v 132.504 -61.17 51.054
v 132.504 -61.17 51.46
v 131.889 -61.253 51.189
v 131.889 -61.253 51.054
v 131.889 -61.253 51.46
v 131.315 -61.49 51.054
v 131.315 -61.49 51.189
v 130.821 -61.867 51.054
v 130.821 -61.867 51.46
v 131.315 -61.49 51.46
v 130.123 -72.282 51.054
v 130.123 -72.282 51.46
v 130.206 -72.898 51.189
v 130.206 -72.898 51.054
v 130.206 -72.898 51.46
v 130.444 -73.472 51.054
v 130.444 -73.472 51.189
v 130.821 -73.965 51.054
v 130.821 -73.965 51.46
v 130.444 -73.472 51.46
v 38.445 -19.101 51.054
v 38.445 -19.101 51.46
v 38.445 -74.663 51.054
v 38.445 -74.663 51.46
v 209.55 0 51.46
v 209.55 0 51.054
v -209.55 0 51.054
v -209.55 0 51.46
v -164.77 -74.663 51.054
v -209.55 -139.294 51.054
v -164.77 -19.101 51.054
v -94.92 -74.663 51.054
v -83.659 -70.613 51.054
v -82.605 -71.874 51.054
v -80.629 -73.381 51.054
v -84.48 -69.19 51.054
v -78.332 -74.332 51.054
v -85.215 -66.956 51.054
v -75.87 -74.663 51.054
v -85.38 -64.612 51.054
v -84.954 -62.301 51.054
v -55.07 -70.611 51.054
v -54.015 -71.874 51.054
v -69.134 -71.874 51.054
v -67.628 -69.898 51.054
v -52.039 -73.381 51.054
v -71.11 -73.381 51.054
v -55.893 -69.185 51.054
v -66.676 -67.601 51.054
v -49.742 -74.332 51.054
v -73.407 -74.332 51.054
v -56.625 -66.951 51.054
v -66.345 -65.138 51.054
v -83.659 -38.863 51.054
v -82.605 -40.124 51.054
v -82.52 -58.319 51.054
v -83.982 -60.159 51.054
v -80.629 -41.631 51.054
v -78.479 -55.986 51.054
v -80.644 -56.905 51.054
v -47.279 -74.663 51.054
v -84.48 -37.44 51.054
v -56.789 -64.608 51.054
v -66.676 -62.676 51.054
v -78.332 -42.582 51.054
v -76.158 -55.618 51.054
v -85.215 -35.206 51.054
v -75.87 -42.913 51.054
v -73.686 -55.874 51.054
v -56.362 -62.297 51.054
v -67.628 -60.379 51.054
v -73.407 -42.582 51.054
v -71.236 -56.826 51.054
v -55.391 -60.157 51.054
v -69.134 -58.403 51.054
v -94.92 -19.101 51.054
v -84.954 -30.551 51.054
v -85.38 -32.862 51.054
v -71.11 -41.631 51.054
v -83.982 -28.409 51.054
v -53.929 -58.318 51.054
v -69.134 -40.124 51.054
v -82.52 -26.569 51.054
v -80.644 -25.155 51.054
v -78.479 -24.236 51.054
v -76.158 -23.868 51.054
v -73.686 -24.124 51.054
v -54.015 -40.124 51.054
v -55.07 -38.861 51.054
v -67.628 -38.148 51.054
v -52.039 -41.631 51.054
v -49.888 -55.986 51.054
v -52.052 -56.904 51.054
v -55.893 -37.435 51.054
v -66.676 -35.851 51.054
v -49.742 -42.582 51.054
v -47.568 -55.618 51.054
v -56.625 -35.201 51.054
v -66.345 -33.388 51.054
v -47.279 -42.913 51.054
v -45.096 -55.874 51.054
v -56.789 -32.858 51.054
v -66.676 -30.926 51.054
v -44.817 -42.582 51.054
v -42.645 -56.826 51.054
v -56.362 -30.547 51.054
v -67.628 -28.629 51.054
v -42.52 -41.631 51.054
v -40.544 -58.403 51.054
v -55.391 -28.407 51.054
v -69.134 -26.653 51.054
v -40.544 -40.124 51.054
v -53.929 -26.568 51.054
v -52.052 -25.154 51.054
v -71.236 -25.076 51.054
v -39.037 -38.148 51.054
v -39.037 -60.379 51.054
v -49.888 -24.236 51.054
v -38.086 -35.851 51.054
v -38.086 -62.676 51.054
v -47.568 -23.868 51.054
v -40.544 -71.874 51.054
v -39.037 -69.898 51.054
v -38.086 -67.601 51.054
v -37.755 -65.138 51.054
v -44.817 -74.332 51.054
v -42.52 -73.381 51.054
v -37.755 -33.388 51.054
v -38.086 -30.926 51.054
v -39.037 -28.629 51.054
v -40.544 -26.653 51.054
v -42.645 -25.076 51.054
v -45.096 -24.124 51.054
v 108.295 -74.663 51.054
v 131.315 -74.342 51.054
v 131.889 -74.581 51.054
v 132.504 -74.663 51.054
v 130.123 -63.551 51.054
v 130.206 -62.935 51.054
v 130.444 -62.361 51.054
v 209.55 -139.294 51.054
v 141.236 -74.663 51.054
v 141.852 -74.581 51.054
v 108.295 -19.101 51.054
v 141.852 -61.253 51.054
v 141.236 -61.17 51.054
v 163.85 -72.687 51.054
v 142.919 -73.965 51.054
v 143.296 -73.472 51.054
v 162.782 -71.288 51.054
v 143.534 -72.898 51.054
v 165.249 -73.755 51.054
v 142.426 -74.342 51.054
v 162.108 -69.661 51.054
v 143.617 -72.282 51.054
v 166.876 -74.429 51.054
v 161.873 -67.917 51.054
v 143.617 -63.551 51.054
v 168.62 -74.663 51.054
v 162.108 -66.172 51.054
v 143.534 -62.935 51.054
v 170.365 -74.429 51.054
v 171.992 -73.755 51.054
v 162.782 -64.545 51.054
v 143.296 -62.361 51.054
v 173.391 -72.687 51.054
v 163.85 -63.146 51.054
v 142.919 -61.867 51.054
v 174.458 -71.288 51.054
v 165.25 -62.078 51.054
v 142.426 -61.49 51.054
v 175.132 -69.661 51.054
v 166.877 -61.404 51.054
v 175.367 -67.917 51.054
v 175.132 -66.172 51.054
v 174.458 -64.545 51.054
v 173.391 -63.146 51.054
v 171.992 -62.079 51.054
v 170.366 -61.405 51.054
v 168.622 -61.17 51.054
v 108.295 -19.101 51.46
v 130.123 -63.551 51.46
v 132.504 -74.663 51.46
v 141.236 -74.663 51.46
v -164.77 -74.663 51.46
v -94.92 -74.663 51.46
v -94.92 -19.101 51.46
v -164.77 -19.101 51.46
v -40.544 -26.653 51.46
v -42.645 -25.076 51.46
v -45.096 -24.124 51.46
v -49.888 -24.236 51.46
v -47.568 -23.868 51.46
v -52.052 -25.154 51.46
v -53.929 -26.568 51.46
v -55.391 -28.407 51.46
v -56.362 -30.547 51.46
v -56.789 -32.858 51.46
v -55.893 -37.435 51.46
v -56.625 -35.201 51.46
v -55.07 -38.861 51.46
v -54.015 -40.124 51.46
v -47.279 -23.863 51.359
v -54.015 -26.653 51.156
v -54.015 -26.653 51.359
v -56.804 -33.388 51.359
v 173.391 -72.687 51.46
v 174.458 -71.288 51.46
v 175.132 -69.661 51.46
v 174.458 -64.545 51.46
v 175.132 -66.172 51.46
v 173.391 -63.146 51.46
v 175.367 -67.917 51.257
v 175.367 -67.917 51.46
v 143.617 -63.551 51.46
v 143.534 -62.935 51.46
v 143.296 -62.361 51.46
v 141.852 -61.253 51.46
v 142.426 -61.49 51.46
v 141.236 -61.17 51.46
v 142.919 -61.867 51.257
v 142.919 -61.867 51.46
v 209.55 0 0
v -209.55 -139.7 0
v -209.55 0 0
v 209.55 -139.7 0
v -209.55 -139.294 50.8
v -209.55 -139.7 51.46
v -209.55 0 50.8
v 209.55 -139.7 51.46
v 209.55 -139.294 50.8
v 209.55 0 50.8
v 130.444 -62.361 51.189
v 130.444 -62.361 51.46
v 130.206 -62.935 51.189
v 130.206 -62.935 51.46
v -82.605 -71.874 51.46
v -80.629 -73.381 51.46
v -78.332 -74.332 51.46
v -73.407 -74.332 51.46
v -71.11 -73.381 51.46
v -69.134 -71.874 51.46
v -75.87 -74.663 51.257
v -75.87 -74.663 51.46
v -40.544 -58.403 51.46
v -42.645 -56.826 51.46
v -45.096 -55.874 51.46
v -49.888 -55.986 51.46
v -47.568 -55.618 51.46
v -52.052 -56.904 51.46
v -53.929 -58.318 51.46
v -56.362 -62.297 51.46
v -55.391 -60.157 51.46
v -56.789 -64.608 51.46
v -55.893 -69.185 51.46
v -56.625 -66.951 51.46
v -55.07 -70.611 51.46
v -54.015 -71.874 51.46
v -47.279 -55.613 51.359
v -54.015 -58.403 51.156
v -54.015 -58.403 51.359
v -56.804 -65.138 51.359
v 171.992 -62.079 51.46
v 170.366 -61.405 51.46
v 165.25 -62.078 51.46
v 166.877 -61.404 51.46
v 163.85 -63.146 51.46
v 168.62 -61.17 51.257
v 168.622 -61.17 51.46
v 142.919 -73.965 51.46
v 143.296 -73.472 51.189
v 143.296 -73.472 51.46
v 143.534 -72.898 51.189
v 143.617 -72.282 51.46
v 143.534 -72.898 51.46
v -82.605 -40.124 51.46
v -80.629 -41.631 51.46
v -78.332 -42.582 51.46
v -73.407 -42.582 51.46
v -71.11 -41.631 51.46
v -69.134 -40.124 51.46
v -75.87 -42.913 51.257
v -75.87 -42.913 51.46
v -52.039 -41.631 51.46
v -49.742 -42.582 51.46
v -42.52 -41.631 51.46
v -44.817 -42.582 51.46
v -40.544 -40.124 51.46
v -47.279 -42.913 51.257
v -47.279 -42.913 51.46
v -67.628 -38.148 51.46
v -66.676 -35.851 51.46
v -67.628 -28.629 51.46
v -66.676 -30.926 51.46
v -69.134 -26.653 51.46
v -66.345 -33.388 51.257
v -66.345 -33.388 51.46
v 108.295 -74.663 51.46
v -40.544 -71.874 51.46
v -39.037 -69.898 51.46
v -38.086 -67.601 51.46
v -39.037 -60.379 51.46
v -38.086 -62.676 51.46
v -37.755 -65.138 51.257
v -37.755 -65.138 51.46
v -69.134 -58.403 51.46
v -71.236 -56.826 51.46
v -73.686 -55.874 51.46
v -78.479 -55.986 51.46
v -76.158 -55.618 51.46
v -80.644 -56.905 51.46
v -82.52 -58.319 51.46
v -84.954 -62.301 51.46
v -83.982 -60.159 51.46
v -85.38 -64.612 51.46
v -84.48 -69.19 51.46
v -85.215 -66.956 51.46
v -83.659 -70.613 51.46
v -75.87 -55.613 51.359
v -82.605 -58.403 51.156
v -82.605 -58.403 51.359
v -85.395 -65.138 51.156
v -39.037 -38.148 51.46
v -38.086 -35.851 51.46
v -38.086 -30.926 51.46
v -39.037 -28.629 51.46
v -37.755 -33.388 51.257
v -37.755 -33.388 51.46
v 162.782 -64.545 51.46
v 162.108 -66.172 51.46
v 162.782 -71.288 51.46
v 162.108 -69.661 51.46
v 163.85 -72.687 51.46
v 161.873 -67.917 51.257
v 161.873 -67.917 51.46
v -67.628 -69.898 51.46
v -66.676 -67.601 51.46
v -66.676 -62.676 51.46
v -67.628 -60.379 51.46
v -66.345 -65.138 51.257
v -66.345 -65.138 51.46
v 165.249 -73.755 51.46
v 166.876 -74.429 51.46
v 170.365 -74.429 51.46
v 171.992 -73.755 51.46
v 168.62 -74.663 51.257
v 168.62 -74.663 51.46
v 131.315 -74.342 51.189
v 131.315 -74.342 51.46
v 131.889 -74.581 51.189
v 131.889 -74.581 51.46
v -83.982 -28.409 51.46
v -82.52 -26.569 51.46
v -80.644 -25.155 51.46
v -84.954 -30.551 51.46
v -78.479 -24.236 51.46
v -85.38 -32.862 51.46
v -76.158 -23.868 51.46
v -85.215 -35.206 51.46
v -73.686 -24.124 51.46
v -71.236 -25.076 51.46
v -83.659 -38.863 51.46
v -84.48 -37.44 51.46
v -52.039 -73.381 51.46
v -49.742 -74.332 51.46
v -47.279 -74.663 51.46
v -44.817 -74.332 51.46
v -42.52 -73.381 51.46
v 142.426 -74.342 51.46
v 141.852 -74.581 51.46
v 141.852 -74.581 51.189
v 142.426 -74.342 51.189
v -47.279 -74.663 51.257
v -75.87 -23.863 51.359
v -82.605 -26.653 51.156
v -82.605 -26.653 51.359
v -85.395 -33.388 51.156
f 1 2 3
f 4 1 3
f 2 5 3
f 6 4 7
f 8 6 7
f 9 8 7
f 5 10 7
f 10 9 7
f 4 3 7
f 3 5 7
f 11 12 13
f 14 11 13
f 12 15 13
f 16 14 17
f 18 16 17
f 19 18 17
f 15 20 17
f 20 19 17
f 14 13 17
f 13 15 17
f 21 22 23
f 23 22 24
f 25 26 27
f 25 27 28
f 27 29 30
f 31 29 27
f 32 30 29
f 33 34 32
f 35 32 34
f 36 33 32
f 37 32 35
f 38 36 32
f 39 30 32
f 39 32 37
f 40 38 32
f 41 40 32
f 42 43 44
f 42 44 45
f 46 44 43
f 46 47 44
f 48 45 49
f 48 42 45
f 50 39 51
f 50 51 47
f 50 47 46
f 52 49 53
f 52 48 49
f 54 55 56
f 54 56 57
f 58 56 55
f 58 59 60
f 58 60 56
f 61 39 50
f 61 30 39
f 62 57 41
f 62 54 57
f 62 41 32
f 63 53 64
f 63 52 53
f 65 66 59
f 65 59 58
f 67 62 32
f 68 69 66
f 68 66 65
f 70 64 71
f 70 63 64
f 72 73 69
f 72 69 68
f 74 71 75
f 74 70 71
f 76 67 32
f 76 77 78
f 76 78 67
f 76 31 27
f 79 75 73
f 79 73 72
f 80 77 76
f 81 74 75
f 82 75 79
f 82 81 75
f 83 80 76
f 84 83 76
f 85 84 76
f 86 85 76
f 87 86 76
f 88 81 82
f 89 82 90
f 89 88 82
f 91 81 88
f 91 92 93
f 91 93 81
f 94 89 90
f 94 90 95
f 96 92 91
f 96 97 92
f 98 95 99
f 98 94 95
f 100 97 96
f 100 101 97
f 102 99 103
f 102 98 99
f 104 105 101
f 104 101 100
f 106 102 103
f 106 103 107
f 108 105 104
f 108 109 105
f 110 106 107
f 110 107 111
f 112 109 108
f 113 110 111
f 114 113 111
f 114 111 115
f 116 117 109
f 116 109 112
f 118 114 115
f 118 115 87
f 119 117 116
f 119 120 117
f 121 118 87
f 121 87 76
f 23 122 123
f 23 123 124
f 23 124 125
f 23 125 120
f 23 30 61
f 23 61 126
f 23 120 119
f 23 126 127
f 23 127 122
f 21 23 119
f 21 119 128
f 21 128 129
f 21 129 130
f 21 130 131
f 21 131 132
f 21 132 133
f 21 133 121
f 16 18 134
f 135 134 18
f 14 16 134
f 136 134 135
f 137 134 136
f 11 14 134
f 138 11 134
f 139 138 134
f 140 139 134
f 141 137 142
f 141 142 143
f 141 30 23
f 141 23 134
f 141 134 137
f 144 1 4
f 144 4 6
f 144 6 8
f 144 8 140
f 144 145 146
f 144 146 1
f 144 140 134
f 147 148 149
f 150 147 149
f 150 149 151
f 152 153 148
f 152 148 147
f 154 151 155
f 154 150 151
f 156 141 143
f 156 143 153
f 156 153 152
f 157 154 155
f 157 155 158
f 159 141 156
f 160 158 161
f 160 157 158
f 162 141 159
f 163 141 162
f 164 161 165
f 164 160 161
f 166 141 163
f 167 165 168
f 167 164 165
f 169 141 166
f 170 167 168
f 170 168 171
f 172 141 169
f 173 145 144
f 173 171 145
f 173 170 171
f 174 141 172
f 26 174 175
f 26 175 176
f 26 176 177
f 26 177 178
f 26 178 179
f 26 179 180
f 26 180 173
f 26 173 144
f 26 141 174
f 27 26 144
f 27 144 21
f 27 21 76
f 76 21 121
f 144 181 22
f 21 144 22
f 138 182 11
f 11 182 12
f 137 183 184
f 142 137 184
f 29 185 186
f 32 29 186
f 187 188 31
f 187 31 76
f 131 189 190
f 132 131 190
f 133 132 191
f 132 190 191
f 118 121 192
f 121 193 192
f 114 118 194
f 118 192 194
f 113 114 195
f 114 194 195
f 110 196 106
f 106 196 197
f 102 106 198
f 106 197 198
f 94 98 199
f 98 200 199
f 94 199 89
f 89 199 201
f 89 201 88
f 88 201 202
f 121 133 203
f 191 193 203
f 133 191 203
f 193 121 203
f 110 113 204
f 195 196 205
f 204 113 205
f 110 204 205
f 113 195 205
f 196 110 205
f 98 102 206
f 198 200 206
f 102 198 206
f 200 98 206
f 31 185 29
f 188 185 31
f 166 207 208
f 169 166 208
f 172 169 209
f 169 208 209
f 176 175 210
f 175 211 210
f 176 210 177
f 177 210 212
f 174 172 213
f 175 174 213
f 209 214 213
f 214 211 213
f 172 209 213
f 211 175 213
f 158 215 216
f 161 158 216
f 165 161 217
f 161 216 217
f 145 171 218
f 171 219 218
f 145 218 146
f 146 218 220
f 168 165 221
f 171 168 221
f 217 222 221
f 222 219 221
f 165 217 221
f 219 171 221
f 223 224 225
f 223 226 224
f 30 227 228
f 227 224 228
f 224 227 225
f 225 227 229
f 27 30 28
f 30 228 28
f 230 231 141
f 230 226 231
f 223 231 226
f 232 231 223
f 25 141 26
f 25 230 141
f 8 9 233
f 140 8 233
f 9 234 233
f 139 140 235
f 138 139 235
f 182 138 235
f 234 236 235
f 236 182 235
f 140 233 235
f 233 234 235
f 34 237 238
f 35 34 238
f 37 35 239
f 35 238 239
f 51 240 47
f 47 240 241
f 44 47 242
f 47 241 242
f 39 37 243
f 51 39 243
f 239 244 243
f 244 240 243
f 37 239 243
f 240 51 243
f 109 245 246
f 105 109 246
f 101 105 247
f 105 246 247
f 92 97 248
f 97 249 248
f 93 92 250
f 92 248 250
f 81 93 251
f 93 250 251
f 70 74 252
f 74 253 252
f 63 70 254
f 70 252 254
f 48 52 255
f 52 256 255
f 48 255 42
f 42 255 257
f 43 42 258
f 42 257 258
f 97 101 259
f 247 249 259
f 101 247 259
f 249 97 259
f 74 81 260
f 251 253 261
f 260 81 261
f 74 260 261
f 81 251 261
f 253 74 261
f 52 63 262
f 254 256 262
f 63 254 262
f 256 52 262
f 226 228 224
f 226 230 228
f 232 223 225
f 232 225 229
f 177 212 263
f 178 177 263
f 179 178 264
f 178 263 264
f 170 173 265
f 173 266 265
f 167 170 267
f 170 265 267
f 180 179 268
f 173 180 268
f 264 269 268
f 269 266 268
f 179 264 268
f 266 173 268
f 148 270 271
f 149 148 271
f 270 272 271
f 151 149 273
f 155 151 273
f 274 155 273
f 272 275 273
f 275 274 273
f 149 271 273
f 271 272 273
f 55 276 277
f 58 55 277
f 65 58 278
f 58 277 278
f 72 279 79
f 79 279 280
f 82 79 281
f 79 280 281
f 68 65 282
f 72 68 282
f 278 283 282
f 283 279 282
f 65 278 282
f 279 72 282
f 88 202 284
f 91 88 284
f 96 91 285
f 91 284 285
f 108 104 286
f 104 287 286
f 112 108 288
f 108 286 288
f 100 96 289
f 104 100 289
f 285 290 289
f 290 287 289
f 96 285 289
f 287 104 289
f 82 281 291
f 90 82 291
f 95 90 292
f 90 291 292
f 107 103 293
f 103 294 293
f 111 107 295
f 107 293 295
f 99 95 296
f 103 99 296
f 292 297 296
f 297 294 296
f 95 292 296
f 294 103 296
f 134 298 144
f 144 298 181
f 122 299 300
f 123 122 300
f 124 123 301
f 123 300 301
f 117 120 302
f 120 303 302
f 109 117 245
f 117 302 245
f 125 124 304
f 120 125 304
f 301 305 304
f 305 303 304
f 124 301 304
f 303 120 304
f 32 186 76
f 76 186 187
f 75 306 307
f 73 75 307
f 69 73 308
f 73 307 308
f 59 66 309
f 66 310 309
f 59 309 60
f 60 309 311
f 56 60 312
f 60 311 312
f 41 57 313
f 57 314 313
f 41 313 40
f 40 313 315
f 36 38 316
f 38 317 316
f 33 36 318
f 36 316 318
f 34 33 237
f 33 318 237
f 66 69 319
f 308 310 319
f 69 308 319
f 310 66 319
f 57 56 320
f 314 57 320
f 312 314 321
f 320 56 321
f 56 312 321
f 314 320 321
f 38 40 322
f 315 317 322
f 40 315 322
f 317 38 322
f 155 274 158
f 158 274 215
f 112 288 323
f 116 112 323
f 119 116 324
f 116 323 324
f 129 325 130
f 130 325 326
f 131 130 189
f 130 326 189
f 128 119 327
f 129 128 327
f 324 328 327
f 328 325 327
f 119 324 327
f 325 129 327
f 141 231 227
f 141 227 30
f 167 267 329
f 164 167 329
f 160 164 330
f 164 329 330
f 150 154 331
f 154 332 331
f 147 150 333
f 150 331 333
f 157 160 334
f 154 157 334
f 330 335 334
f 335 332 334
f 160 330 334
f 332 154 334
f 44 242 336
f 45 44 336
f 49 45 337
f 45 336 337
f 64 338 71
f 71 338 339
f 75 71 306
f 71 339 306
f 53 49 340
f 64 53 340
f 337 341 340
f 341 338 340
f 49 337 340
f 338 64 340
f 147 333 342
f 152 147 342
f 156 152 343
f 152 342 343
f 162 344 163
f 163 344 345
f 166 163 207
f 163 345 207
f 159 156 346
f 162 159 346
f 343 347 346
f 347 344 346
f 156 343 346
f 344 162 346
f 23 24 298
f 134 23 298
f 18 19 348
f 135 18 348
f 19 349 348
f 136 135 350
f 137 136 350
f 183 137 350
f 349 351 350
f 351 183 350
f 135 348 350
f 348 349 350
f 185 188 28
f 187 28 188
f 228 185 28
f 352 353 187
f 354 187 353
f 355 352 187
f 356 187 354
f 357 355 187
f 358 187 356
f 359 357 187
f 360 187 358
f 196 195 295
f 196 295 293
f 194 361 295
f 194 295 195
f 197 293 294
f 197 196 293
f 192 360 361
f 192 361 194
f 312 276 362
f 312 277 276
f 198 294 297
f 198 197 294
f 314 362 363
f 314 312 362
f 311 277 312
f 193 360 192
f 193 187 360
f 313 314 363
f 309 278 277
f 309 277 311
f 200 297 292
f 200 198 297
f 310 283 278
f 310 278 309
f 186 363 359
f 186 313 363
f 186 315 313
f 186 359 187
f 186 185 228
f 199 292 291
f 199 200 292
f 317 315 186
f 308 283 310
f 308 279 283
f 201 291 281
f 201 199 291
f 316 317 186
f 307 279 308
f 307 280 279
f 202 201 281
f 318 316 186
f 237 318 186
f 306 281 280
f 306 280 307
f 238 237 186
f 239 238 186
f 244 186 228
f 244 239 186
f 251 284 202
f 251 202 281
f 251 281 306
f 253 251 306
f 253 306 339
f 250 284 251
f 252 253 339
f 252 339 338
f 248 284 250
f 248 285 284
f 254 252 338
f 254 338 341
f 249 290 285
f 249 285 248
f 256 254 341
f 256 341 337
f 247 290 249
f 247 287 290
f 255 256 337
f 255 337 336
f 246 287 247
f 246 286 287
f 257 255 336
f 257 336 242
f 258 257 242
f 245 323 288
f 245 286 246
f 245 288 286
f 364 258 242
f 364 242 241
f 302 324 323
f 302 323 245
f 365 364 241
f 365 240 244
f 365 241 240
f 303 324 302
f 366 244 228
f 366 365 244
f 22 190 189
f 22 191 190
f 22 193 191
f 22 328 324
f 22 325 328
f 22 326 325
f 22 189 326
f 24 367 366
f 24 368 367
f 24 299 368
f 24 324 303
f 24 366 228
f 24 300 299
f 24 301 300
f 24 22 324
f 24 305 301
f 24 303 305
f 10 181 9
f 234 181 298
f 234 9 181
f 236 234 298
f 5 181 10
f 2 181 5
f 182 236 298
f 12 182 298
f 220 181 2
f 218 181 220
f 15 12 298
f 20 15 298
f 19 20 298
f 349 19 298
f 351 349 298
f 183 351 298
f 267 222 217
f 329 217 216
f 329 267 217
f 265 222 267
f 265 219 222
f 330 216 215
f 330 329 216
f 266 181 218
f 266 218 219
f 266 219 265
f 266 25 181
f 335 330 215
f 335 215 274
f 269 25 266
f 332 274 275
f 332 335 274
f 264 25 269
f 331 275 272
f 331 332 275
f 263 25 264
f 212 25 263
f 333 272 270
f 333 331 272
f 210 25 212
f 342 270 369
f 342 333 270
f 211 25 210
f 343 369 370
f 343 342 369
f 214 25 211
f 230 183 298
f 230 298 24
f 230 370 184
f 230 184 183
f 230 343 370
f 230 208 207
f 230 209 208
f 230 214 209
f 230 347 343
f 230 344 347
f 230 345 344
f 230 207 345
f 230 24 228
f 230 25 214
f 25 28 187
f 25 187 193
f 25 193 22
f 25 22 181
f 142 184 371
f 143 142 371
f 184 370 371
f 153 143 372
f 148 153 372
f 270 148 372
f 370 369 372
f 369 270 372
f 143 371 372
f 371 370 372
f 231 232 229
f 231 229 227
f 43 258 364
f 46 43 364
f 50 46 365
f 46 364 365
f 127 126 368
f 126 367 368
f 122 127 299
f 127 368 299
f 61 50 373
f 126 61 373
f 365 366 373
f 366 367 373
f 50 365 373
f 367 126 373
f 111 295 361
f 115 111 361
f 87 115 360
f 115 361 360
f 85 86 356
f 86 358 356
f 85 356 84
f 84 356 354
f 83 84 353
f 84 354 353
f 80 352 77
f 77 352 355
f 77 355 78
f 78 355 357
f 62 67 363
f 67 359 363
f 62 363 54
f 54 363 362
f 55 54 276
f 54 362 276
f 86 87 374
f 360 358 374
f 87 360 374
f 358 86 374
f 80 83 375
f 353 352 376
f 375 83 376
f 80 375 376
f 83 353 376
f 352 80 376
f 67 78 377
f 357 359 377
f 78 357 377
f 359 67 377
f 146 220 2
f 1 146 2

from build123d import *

# Parameters (mm, degrees)
F1_DEPTH = 209.55
F2_W     = 69.85
F2_H     = 55.5625
F3_DEPTH = 0.4064


# Not quite as in the source:
# - the dataset's text gives a spline's control points without its knots; the knots are read off the source's solid


with BuildPart() as f1:
    # F0 (on Right) → F1 (new body, symmetric)
    with BuildSketch(Plane.YZ):
        Polygon((-139.7, 0), (0, 0), (0, 50.8), (-139.2936, 50.8), (-139.2936, 51.054), (0, 51.054), (0, 51.4604), (-139.7, 51.4604), align=None)
    extrude(amount=F1_DEPTH, both=True)

    # F2 (on face) → F3 (cut, through all)
    with BuildSketch(Plane.XY.offset(51.4604)):
        with Locations((-129.8449253923, -46.8822261976)):
            Rectangle(F2_W, F2_H)
        Polygon((108.2948828077, -19.1009761976), (38.4448828077, -19.1009761976), (38.4448828077, -74.6634761976), (108.2948828077, -74.6634761976), (108.2948828077, -68.4133743976), (108.2948828077, -42.0156877976), align=None)
        with BuildLine():
            add(Edge.make_bspline(
                [(130.8209744077, -61.8670069976), (130.3807162077, -62.3079763976), (130.1230078077, -62.9274315976), (130.1230078077, -63.5509761976)],
                knots=[1, 1, 1, 1, 2, 2, 2, 2], degree=3))
            Line((130.1230078077, -63.5509761976), (130.1230078077, -72.2822261976))
            add(Edge.make_bspline(
                [(130.1230078077, -72.2822261976), (130.1230078077, -72.9057961976), (130.3807162077, -73.5252259976), (130.8209744077, -73.9654841976)],
                knots=[0, 0, 0, 0, 1, 1, 1, 1], degree=3))
            add(Edge.make_bspline(
                [(130.8209744077, -73.9654841976), (131.2619438077, -74.4064789976), (131.8813990077, -74.6634761976), (132.5042578077, -74.6634761976)],
                knots=[1, 1, 1, 1, 2, 2, 2, 2], degree=3))
            Line((132.5042578077, -74.6634761976), (141.2355078077, -74.6634761976))
            add(Edge.make_bspline(
                [(141.2355078077, -74.6634761976), (141.8597382077, -74.6634761976), (142.4784822077, -74.4064789976), (142.9194516077, -73.9654841976)],
                knots=[0, 0, 0, 0, 1, 1, 1, 1], degree=3))
            add(Edge.make_bspline(
                [(142.9194516077, -73.9654841976), (143.3604210077, -73.5252259976), (143.6167578077, -72.9057961976), (143.6167578077, -72.2822261976)],
                knots=[1, 1, 1, 1, 2, 2, 2, 2], degree=3))
            Line((143.6167578077, -72.2822261976), (143.6167578077, -63.5509761976))
            add(Edge.make_bspline(
                [(143.6167578077, -63.5509761976), (143.6167578077, -62.9274315976), (143.3604210077, -62.3079763976), (142.9194516077, -61.8670069976), (142.4784822077, -61.4260375976), (141.8597382077, -61.1697261976), (141.2355078077, -61.1697261976)],
                knots=[0, 0, 0, 0, 1, 1, 1, 2, 2, 2, 2], degree=3))
            Line((141.2355078077, -61.1697261976), (132.5042578077, -61.1697261976))
            add(Edge.make_bspline(
                [(132.5042578077, -61.1697261976), (131.8813990077, -61.1697261976), (131.2619438077, -61.4260375976), (130.8209744077, -61.8670069976)],
                knots=[0, 0, 0, 0, 1, 1, 1, 1], degree=3))
        make_face()
        with BuildLine():
            add(Edge.make_bspline(
                [(-69.1344295923, -26.6533105976), (-70.8976467923, -24.8901187976), (-73.3763565923, -23.8634761976), (-75.8699253923, -23.8634761976)],
                knots=[7, 7, 7, 7, 8, 8, 8, 8], degree=3))
            add(Edge.make_bspline(
                [(-75.8699253923, -23.8634761976), (-78.3631639923, -23.8634761976), (-80.8419245923, -24.8901187976), (-82.6050909923, -26.6533105976), (-84.3682827923, -28.4165277976), (-85.3949253923, -30.8949327976), (-85.3949253923, -33.3884761976), (-85.3949253923, -35.8820449976), (-84.3682827923, -38.3604499976), (-82.6050909923, -40.1236163976)],
                knots=[0, 0, 0, 0, 1, 1, 1, 2, 2, 2, 3, 3, 3, 3], degree=3))
            add(Edge.make_bspline(
                [(-82.6050909923, -40.1236163976), (-80.8419245923, -41.8868589976), (-78.3631639923, -42.9134761976), (-75.8699253923, -42.9134761976), (-73.3763565923, -42.9134761976), (-70.8976467923, -41.8868589976), (-69.1344295923, -40.1236163976)],
                knots=[3, 3, 3, 3, 4, 4, 4, 5, 5, 5, 5], degree=3))
            add(Edge.make_bspline(
                [(-69.1344295923, -40.1236163976), (-67.3712377923, -38.3604499976), (-66.3449253923, -35.8820449976), (-66.3449253923, -33.3884761976), (-66.3449253923, -30.8949327976), (-67.3712377923, -28.4165277976), (-69.1344295923, -26.6533105976)],
                knots=[5, 5, 5, 5, 6, 6, 6, 7, 7, 7, 7], degree=3))
        make_face()
        with BuildLine():
            add(Edge.make_bspline(
                [(-69.1344295923, -58.4033105976), (-70.8976467923, -56.6401187976), (-73.3763565923, -55.6134761976), (-75.8699253923, -55.6134761976)],
                knots=[7, 7, 7, 7, 8, 8, 8, 8], degree=3))
            add(Edge.make_bspline(
                [(-75.8699253923, -55.6134761976), (-78.3631639923, -55.6134761976), (-80.8419245923, -56.6401187976), (-82.6050909923, -58.4033105976), (-84.3682827923, -60.1665277976), (-85.3949253923, -62.6449327976), (-85.3949253923, -65.1384761976), (-85.3949253923, -67.6320449976), (-84.3682827923, -70.1104499976), (-82.6050909923, -71.8736163976)],
                knots=[0, 0, 0, 0, 1, 1, 1, 2, 2, 2, 3, 3, 3, 3], degree=3))
            add(Edge.make_bspline(
                [(-82.6050909923, -71.8736163976), (-80.8419245923, -73.6368589976), (-78.3631639923, -74.6634761976), (-75.8699253923, -74.6634761976), (-73.3763565923, -74.6634761976), (-70.8976467923, -73.6368589976), (-69.1344295923, -71.8736163976)],
                knots=[3, 3, 3, 3, 4, 4, 4, 5, 5, 5, 5], degree=3))
            add(Edge.make_bspline(
                [(-69.1344295923, -71.8736163976), (-67.3712377923, -70.1104499976), (-66.3449253923, -67.6320449976), (-66.3449253923, -65.1384761976), (-66.3449253923, -62.6449327976), (-67.3712377923, -60.1665277976), (-69.1344295923, -58.4033105976)],
                knots=[5, 5, 5, 5, 6, 6, 6, 7, 7, 7, 7], degree=3))
        make_face()
        with BuildLine():
            add(Edge.make_bspline(
                [(-40.5442911923, -58.4033105976), (-42.3074575923, -56.6401187976), (-44.7858879923, -55.6134761976), (-47.2794567923, -55.6134761976)],
                knots=[7, 7, 7, 7, 8, 8, 8, 8], degree=3))
            add(Edge.make_bspline(
                [(-47.2794567923, -55.6134761976), (-49.7733303923, -55.6134761976), (-52.2517353923, -56.6401187976), (-54.0149271923, -58.4033105976), (-55.7781443923, -60.1665277976), (-56.8044567923, -62.6449327976), (-56.8044567923, -65.1384761976), (-56.8044567923, -67.6320449976), (-55.7781443923, -70.1104499976), (-54.0149271923, -71.8736163976)],
                knots=[0, 0, 0, 0, 1, 1, 1, 2, 2, 2, 3, 3, 3, 3], degree=3))
            add(Edge.make_bspline(
                [(-54.0149271923, -71.8736163976), (-52.2517353923, -73.6368589976), (-49.7733303923, -74.6634761976), (-47.2794567923, -74.6634761976), (-44.7858879923, -74.6634761976), (-42.3074575923, -73.6368589976), (-40.5442911923, -71.8736163976)],
                knots=[3, 3, 3, 3, 4, 4, 4, 5, 5, 5, 5], degree=3))
            add(Edge.make_bspline(
                [(-40.5442911923, -71.8736163976), (-38.7807183923, -70.1104499976), (-37.7547615923, -67.6320449976), (-37.7547615923, -65.1384761976), (-37.7547615923, -62.6449327976), (-38.7807183923, -60.1665277976), (-40.5442911923, -58.4033105976)],
                knots=[5, 5, 5, 5, 6, 6, 6, 7, 7, 7, 7], degree=3))
        make_face()
        with BuildLine():
            add(Edge.make_bspline(
                [(-40.5442911923, -26.6533105976), (-42.3074575923, -24.8901187976), (-44.7858879923, -23.8634761976), (-47.2794567923, -23.8634761976)],
                knots=[7, 7, 7, 7, 8, 8, 8, 8], degree=3))
            add(Edge.make_bspline(
                [(-47.2794567923, -23.8634761976), (-49.7733303923, -23.8634761976), (-52.2517353923, -24.8901187976), (-54.0149271923, -26.6533105976), (-55.7781443923, -28.4165277976), (-56.8044567923, -30.8949327976), (-56.8044567923, -33.3884761976), (-56.8044567923, -35.8820449976), (-55.7781443923, -38.3604499976), (-54.0149271923, -40.1236163976)],
                knots=[0, 0, 0, 0, 1, 1, 1, 2, 2, 2, 3, 3, 3, 3], degree=3))
            add(Edge.make_bspline(
                [(-54.0149271923, -40.1236163976), (-52.2517353923, -41.8868589976), (-49.7733303923, -42.9134761976), (-47.2794567923, -42.9134761976), (-44.7858879923, -42.9134761976), (-42.3074575923, -41.8868589976), (-40.5442911923, -40.1236163976)],
                knots=[3, 3, 3, 3, 4, 4, 4, 5, 5, 5, 5], degree=3))
            add(Edge.make_bspline(
                [(-40.5442911923, -40.1236163976), (-38.7807183923, -38.3604499976), (-37.7547615923, -35.8820449976), (-37.7547615923, -33.3884761976), (-37.7547615923, -30.8949327976), (-38.7807183923, -28.4165277976), (-40.5442911923, -26.6533105976)],
                knots=[5, 5, 5, 5, 6, 6, 6, 7, 7, 7, 7], degree=3))
        make_face()
        with BuildLine():
            add(Edge.make_bspline(
                [(173.3906378077, -63.1458461976), (172.1421516077, -61.8966487976), (170.3872148077, -61.1697261976), (168.6198828077, -61.1697261976)],
                knots=[7, 7, 7, 7, 8, 8, 8, 8], degree=3))
            add(Edge.make_bspline(
                [(168.6198828077, -61.1697261976), (166.8539224077, -61.1697261976), (165.0989856077, -61.8966487976), (163.8497882077, -63.1458461976)],
                knots=[0, 0, 0, 0, 1, 1, 1, 1], degree=3))
            add(Edge.make_bspline(
                [(163.8497882077, -63.1458461976), (162.6006162077, -64.3943577976), (161.8730078077, -66.1499549976), (161.8730078077, -67.9166011976), (161.8730078077, -69.6825615976), (162.6006162077, -71.4381841976), (163.8497882077, -72.6873815976)],
                knots=[1, 1, 1, 1, 2, 2, 2, 3, 3, 3, 3], degree=3))
            add(Edge.make_bspline(
                [(163.8497882077, -72.6873815976), (165.0989856077, -73.9358677976), (166.8539224077, -74.6634761976), (168.6198828077, -74.6634761976), (170.3872148077, -74.6634761976), (172.1421516077, -73.9358677976), (173.3906378077, -72.6873815976)],
                knots=[3, 3, 3, 3, 4, 4, 4, 5, 5, 5, 5], degree=3))
            add(Edge.make_bspline(
                [(173.3906378077, -72.6873815976), (174.6398098077, -71.4381841976), (175.3667578077, -69.6825615976), (175.3667578077, -67.9166011976), (175.3667578077, -66.1499549976), (174.6398098077, -64.3943577976), (173.3906378077, -63.1458461976)],
                knots=[5, 5, 5, 5, 6, 6, 6, 7, 7, 7, 7], degree=3))
        make_face()
    extrude(amount=-F3_DEPTH, mode=Mode.SUBTRACT)


solid = f1.part
